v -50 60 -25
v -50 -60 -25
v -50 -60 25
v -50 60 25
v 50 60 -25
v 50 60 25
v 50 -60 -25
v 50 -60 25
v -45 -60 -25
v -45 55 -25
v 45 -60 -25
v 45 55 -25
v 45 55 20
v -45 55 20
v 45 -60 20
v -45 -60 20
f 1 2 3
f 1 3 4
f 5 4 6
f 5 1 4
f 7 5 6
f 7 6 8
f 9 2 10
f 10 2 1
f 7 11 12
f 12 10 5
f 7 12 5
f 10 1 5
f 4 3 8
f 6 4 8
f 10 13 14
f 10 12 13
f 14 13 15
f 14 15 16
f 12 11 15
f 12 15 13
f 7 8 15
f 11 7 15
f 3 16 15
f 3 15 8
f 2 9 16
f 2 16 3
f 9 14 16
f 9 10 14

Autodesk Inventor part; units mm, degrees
ref_plane "YZ Plane" through (0, 0, 0) normal (1, 0, 0) x (0, 1, 0)
ref_plane "XZ Plane" through (0, 0, 0) normal (0, 1, 0) x (-1, 0, 0)
ref_plane "XY Plane" through (0, 0, 0) normal (0, 0, 1) x (1, 0, 0)
sketch "Sketch1" plane through (0, 0, 0) normal (0, 0, 1) x (1, 0, 0)
  line L0 (-50, 60) -> (50, 60)
  line L1 (50, 60) -> (50, -60)
  line L2 (50, -60) -> (-50, -60)
  line L3 (-50, -60) -> (-50, 60)
  point P0 (0, 0)
  dimension "d0" = 100
  dimension "d1" = 120
  dimension "d2" = 60
  dimension "d3" = 50
extrude "Extrusion1" add sketch "Sketch1" along normal mid plane 50
sketch "Sketch2" plane through (0, 0, -25) normal (0, 0, -1) x (-1, 0, 0)
  line L0 (-45, 55) -> (45, 55)
  line L1 (45, 55) -> (45, -60)
  line L2 (45, -60) -> (-45, -60)
  line L3 (-45, -60) -> (-45, 55)
  line L4 (-50, -60) -> (-50, 60) projected
  line L5 (-50, 60) -> (50, 60) projected
  line L6 (-50, 60) -> (50, 60)
  line L7 (50, -60) -> (-50, -60) projected
  line L8 (50, 60) -> (50, -60)
  line L9 (50, -60) -> (-50, -60)
  line L10 (-50, -60) -> (-50, 60)
  point P0 (0, 0)
  point P1 (0, -60)
  dimension "d6" = 5
  dimension "d7" = 5
  dimension "d8" = 5
extrude "Extrusion2" cut sketch "Sketch2" against normal blind 45 contours L0 L1 L2 L3
properties part number "casing"
